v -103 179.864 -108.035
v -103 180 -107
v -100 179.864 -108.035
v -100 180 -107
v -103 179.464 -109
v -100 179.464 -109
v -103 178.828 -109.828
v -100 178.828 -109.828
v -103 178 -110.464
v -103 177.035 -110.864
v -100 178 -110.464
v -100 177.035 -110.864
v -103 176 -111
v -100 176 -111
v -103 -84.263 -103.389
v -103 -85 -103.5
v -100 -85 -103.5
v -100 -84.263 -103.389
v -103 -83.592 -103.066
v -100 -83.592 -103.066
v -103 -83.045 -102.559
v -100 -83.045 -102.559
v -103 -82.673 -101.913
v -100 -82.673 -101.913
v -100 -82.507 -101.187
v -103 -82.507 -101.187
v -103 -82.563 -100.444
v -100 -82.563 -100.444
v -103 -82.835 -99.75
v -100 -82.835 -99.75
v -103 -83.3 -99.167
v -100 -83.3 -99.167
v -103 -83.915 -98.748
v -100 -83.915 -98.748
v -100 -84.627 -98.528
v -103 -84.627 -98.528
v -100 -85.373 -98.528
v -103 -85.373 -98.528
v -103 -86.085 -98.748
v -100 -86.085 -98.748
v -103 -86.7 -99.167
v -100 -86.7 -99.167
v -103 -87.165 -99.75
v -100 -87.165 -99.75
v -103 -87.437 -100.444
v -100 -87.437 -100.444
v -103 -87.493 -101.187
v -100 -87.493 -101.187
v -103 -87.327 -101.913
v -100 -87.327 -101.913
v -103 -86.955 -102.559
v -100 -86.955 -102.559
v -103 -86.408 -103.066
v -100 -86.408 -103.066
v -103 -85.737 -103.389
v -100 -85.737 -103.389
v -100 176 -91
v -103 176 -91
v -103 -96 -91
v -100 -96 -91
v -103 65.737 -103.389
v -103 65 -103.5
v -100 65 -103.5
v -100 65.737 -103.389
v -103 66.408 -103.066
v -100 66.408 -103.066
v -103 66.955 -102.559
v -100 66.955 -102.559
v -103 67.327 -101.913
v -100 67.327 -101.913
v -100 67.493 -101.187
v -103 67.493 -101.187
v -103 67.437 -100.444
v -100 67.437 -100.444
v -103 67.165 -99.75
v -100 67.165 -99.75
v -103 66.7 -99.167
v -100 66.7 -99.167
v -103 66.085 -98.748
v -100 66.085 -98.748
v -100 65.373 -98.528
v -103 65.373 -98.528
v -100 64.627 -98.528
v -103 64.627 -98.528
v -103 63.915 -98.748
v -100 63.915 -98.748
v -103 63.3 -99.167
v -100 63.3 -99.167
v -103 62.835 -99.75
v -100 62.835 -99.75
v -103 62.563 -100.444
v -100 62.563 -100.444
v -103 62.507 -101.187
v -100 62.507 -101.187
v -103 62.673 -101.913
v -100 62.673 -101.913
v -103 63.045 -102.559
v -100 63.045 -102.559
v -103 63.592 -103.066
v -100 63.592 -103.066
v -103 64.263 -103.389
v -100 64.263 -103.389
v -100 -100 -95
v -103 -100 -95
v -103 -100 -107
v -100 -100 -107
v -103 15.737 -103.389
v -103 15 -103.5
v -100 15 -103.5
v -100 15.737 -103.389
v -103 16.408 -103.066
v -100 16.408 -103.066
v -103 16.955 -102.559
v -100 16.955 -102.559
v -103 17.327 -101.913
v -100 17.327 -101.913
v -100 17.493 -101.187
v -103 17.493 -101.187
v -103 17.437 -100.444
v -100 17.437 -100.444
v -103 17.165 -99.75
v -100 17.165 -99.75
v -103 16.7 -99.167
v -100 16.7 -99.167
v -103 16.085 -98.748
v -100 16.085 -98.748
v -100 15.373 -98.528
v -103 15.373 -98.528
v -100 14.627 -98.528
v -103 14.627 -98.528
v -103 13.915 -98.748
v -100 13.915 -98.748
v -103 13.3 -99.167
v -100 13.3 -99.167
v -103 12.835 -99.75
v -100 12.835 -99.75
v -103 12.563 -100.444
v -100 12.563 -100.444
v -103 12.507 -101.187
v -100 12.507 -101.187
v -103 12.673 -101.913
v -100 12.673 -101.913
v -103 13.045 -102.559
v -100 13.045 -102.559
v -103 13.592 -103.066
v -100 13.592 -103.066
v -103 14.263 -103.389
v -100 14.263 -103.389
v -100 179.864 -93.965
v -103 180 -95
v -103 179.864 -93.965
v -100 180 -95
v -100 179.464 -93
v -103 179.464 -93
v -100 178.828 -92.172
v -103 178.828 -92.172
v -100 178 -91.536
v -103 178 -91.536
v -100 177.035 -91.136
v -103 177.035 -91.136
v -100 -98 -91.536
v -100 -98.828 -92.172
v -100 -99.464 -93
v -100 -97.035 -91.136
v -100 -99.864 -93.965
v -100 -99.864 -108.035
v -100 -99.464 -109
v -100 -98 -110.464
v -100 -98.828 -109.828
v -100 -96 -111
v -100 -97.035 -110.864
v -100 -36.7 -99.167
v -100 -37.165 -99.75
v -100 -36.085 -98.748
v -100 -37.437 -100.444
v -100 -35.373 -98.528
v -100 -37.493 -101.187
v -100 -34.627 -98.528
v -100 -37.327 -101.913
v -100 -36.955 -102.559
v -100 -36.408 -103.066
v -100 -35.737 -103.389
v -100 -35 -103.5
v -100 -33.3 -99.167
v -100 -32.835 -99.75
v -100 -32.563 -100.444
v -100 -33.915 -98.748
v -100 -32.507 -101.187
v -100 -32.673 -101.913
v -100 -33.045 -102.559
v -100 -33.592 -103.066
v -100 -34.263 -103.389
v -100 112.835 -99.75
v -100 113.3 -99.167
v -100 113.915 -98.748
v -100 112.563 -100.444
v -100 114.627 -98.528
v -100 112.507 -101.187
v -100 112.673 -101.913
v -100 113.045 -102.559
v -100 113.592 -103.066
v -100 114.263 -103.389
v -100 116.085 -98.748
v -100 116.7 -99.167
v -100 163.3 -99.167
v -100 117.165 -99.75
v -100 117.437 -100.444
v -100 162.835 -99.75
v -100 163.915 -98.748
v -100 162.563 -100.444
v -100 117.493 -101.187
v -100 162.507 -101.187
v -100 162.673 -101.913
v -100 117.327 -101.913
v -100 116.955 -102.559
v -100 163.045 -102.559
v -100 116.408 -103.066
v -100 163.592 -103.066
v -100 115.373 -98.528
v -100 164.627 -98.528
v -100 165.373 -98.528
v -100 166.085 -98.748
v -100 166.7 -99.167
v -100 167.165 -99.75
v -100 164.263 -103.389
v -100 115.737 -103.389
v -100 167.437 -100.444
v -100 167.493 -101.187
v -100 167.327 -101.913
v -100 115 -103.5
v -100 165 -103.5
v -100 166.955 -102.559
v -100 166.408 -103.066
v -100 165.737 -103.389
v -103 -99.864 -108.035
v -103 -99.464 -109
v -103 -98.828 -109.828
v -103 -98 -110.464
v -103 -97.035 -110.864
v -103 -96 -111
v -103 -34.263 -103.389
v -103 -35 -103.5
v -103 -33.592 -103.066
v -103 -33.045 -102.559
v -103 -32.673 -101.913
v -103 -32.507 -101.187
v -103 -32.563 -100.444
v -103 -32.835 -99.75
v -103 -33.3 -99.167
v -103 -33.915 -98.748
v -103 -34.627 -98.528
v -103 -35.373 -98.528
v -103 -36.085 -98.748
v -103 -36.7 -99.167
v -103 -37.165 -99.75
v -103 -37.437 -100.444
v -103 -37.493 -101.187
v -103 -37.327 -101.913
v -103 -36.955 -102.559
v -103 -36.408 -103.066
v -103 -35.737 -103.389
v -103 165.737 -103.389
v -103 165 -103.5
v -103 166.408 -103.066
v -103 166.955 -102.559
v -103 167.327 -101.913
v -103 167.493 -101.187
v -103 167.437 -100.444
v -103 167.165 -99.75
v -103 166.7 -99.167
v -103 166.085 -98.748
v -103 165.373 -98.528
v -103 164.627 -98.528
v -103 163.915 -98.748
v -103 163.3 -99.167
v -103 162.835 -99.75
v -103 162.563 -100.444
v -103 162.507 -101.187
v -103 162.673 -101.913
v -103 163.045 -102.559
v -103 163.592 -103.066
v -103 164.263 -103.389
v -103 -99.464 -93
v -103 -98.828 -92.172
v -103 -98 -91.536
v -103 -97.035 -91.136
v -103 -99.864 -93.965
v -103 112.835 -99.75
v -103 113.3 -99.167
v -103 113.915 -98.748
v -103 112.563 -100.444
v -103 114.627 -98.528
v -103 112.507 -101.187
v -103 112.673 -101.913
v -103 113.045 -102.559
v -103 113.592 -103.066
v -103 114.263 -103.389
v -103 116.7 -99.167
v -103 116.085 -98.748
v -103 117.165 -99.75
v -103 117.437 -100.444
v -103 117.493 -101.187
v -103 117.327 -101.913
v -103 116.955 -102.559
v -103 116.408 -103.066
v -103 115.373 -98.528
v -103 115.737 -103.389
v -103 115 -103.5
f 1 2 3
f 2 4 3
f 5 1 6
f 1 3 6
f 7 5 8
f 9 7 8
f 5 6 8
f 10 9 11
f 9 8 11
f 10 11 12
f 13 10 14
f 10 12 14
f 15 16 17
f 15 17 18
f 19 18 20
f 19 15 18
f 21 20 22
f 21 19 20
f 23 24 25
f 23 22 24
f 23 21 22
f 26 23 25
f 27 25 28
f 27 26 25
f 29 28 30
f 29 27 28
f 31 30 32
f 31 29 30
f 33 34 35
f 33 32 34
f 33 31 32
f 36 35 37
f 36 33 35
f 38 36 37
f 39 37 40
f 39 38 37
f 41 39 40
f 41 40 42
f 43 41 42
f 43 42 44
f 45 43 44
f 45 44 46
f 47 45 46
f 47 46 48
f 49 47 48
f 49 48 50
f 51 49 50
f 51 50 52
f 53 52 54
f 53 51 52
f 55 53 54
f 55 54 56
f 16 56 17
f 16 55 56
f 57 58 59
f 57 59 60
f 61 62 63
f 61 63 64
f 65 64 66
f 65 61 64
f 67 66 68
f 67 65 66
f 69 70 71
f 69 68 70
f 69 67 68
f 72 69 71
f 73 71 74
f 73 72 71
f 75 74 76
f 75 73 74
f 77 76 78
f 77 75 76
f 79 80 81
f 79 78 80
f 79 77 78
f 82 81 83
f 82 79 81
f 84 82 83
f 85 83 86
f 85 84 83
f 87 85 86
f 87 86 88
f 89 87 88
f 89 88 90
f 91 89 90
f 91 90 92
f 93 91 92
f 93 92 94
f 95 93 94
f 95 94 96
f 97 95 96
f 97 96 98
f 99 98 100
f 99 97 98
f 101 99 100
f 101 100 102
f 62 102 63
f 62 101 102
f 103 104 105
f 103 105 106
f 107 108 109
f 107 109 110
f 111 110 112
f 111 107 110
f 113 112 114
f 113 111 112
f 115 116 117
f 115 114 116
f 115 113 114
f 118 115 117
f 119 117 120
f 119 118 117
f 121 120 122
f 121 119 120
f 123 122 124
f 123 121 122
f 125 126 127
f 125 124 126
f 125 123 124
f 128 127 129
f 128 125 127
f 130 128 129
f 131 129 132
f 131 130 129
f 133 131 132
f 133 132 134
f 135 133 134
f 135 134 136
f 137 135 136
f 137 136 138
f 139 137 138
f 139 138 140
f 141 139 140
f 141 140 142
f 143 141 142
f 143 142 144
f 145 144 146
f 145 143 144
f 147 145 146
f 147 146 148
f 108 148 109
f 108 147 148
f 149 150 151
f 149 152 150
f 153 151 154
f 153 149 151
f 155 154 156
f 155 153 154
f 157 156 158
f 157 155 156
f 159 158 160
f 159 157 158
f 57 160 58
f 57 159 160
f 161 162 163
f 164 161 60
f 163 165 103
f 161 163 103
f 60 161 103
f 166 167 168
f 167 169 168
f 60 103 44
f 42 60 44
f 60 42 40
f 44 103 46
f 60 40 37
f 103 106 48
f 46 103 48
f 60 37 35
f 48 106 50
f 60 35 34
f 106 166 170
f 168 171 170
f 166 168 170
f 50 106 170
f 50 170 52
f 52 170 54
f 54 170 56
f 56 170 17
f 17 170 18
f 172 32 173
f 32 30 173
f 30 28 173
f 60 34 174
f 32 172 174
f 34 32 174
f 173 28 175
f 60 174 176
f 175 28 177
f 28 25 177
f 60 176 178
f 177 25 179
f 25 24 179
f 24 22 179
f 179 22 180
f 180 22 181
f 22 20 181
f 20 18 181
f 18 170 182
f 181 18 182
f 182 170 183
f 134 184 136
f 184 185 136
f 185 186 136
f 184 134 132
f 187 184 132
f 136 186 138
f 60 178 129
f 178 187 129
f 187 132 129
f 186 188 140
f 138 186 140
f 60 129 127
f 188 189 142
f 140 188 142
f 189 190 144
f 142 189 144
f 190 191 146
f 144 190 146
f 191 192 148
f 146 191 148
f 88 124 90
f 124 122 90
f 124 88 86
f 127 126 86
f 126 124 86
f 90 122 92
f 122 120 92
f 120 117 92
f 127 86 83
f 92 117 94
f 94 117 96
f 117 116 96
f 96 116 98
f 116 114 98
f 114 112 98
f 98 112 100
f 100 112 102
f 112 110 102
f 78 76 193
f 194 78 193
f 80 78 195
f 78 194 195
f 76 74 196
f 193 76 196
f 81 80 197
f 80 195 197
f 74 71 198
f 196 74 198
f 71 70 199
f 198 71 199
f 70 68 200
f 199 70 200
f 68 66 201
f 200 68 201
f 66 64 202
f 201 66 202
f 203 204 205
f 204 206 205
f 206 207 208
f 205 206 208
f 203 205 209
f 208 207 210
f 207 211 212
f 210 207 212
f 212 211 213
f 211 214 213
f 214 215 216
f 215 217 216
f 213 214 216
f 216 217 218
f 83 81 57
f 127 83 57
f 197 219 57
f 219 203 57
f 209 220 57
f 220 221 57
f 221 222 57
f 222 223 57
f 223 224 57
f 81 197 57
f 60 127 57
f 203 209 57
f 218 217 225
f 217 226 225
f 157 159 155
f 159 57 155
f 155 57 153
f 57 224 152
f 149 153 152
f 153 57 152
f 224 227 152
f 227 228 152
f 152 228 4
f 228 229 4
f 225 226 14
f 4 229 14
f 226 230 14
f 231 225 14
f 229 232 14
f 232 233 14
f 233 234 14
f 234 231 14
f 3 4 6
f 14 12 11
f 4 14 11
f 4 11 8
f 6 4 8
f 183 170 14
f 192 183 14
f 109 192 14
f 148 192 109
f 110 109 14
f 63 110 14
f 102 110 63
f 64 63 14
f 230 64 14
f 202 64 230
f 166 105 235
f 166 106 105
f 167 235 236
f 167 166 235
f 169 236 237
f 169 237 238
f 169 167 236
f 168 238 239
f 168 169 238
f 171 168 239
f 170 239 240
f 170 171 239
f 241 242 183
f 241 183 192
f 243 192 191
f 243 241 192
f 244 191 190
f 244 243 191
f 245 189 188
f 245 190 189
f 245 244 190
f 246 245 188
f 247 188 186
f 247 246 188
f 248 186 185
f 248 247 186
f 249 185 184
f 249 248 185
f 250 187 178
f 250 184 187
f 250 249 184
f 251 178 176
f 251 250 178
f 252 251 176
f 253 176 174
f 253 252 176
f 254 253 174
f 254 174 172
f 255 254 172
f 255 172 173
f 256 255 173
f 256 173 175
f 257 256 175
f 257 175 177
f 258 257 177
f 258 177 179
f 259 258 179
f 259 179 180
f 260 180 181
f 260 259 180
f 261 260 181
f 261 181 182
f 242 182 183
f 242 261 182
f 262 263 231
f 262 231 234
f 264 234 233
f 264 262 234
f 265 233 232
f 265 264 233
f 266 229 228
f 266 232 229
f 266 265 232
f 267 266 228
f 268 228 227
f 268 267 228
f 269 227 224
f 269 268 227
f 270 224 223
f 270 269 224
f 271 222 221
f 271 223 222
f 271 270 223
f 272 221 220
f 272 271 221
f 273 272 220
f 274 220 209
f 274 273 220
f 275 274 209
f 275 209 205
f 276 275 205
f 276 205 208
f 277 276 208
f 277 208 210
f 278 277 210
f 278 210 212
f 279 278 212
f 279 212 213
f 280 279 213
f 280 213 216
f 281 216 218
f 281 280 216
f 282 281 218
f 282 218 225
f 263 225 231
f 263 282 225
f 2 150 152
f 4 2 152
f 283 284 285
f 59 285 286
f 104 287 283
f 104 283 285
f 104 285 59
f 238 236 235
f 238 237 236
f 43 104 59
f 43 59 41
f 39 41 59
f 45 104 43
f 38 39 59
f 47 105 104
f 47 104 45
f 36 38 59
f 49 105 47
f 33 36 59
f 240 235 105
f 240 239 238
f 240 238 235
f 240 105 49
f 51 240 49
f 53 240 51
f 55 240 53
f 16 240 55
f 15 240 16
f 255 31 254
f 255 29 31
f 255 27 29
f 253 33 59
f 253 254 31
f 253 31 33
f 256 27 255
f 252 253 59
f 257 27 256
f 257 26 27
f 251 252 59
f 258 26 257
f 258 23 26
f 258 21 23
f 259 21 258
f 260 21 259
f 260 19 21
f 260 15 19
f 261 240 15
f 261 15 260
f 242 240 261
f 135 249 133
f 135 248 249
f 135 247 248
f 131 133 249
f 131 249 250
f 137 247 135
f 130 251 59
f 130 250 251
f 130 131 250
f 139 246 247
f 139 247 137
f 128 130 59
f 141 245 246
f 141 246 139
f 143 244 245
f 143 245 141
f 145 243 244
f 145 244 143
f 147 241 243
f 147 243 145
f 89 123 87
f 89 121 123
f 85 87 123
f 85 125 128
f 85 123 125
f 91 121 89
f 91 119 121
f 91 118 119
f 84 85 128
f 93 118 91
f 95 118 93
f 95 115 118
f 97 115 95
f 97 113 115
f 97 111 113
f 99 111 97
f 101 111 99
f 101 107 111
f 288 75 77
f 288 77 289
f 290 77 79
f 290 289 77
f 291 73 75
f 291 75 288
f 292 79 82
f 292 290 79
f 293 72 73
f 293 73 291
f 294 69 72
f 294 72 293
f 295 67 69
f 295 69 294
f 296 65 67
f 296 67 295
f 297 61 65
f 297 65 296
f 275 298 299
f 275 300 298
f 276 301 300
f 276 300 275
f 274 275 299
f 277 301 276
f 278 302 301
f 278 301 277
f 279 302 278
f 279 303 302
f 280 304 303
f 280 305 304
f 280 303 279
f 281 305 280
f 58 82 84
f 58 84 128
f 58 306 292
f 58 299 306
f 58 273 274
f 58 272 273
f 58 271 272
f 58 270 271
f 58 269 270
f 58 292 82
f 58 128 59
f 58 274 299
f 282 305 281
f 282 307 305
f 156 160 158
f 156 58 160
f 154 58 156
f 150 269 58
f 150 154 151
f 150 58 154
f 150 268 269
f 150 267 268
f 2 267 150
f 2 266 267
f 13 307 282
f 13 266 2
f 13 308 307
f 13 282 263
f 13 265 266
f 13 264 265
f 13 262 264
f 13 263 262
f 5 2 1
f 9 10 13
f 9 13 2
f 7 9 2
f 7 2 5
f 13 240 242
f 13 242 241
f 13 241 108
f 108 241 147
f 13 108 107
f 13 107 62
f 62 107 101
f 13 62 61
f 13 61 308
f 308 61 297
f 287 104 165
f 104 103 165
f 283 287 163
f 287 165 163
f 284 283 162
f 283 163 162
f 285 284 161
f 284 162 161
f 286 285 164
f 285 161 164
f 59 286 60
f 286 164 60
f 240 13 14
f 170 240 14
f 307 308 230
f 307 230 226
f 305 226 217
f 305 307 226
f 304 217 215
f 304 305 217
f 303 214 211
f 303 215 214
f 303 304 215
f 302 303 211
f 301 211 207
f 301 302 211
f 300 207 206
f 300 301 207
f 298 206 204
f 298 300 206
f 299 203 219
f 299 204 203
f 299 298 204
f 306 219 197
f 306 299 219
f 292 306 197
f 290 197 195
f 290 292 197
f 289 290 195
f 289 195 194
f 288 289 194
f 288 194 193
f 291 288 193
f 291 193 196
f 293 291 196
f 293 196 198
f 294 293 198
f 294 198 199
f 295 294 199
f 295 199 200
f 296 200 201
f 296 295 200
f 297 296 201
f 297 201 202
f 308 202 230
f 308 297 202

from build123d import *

# Parameters (mm, degrees)
CYLINDER055_R       = 2.5
CYLINDER055_DEPTH   = 100
ARRAY001032_Y_COUNT = 6
ARRAY001032_Y_PITCH = 50
BOX030_W            = 3
BOX030_H            = 280
BOX030_DEPTH        = 20
FILLET002_R         = 4


with BuildPart() as horizontal_hole_array006:
    # Cylinder055 → Cylinder055 (new body)
    with BuildSketch(Plane(origin=(-137, -85, -101), x_dir=(0, 0, -1), z_dir=(1, 0, 0))):
        Circle(CYLINDER055_R)
    extrude(amount=CYLINDER055_DEPTH)

    # Array001032 Y: horizontal hole array006 ×6


with BuildPart() as horizontal_hole_array006_1:
    add(horizontal_hole_array006.part)
    with Locations(*[(0, i * ARRAY001032_Y_PITCH, 0) for i in range(1, ARRAY001032_Y_COUNT)]):
        add(horizontal_hole_array006.part)


with BuildPart() as stand_attachment_bottom_plate_cut:
    # Box030 → Box030 (new body)
    with BuildSketch(Plane(origin=(-103, -100, -111), x_dir=(1, 0, 0), z_dir=(0, 0, 1))):
        with Locations((1.5, 140)):
            Rectangle(BOX030_W, BOX030_H)
    extrude(amount=BOX030_DEPTH)

    # Fillet002
    fillet002_edges = [stand_attachment_bottom_plate_cut.edges().sort_by_distance(p)[0] for p in [
        (-101.5, -100, -111),
        (-101.5, -100, -91),
        (-101.5, 180, -111),
        (-101.5, 180, -91),
    ]]
    fillet(fillet002_edges, radius=FILLET002_R)

    # Cut019005: cut horizontal hole array006
    add(horizontal_hole_array006_1.part, mode=Mode.SUBTRACT)


solid = stand_attachment_bottom_plate_cut.part
